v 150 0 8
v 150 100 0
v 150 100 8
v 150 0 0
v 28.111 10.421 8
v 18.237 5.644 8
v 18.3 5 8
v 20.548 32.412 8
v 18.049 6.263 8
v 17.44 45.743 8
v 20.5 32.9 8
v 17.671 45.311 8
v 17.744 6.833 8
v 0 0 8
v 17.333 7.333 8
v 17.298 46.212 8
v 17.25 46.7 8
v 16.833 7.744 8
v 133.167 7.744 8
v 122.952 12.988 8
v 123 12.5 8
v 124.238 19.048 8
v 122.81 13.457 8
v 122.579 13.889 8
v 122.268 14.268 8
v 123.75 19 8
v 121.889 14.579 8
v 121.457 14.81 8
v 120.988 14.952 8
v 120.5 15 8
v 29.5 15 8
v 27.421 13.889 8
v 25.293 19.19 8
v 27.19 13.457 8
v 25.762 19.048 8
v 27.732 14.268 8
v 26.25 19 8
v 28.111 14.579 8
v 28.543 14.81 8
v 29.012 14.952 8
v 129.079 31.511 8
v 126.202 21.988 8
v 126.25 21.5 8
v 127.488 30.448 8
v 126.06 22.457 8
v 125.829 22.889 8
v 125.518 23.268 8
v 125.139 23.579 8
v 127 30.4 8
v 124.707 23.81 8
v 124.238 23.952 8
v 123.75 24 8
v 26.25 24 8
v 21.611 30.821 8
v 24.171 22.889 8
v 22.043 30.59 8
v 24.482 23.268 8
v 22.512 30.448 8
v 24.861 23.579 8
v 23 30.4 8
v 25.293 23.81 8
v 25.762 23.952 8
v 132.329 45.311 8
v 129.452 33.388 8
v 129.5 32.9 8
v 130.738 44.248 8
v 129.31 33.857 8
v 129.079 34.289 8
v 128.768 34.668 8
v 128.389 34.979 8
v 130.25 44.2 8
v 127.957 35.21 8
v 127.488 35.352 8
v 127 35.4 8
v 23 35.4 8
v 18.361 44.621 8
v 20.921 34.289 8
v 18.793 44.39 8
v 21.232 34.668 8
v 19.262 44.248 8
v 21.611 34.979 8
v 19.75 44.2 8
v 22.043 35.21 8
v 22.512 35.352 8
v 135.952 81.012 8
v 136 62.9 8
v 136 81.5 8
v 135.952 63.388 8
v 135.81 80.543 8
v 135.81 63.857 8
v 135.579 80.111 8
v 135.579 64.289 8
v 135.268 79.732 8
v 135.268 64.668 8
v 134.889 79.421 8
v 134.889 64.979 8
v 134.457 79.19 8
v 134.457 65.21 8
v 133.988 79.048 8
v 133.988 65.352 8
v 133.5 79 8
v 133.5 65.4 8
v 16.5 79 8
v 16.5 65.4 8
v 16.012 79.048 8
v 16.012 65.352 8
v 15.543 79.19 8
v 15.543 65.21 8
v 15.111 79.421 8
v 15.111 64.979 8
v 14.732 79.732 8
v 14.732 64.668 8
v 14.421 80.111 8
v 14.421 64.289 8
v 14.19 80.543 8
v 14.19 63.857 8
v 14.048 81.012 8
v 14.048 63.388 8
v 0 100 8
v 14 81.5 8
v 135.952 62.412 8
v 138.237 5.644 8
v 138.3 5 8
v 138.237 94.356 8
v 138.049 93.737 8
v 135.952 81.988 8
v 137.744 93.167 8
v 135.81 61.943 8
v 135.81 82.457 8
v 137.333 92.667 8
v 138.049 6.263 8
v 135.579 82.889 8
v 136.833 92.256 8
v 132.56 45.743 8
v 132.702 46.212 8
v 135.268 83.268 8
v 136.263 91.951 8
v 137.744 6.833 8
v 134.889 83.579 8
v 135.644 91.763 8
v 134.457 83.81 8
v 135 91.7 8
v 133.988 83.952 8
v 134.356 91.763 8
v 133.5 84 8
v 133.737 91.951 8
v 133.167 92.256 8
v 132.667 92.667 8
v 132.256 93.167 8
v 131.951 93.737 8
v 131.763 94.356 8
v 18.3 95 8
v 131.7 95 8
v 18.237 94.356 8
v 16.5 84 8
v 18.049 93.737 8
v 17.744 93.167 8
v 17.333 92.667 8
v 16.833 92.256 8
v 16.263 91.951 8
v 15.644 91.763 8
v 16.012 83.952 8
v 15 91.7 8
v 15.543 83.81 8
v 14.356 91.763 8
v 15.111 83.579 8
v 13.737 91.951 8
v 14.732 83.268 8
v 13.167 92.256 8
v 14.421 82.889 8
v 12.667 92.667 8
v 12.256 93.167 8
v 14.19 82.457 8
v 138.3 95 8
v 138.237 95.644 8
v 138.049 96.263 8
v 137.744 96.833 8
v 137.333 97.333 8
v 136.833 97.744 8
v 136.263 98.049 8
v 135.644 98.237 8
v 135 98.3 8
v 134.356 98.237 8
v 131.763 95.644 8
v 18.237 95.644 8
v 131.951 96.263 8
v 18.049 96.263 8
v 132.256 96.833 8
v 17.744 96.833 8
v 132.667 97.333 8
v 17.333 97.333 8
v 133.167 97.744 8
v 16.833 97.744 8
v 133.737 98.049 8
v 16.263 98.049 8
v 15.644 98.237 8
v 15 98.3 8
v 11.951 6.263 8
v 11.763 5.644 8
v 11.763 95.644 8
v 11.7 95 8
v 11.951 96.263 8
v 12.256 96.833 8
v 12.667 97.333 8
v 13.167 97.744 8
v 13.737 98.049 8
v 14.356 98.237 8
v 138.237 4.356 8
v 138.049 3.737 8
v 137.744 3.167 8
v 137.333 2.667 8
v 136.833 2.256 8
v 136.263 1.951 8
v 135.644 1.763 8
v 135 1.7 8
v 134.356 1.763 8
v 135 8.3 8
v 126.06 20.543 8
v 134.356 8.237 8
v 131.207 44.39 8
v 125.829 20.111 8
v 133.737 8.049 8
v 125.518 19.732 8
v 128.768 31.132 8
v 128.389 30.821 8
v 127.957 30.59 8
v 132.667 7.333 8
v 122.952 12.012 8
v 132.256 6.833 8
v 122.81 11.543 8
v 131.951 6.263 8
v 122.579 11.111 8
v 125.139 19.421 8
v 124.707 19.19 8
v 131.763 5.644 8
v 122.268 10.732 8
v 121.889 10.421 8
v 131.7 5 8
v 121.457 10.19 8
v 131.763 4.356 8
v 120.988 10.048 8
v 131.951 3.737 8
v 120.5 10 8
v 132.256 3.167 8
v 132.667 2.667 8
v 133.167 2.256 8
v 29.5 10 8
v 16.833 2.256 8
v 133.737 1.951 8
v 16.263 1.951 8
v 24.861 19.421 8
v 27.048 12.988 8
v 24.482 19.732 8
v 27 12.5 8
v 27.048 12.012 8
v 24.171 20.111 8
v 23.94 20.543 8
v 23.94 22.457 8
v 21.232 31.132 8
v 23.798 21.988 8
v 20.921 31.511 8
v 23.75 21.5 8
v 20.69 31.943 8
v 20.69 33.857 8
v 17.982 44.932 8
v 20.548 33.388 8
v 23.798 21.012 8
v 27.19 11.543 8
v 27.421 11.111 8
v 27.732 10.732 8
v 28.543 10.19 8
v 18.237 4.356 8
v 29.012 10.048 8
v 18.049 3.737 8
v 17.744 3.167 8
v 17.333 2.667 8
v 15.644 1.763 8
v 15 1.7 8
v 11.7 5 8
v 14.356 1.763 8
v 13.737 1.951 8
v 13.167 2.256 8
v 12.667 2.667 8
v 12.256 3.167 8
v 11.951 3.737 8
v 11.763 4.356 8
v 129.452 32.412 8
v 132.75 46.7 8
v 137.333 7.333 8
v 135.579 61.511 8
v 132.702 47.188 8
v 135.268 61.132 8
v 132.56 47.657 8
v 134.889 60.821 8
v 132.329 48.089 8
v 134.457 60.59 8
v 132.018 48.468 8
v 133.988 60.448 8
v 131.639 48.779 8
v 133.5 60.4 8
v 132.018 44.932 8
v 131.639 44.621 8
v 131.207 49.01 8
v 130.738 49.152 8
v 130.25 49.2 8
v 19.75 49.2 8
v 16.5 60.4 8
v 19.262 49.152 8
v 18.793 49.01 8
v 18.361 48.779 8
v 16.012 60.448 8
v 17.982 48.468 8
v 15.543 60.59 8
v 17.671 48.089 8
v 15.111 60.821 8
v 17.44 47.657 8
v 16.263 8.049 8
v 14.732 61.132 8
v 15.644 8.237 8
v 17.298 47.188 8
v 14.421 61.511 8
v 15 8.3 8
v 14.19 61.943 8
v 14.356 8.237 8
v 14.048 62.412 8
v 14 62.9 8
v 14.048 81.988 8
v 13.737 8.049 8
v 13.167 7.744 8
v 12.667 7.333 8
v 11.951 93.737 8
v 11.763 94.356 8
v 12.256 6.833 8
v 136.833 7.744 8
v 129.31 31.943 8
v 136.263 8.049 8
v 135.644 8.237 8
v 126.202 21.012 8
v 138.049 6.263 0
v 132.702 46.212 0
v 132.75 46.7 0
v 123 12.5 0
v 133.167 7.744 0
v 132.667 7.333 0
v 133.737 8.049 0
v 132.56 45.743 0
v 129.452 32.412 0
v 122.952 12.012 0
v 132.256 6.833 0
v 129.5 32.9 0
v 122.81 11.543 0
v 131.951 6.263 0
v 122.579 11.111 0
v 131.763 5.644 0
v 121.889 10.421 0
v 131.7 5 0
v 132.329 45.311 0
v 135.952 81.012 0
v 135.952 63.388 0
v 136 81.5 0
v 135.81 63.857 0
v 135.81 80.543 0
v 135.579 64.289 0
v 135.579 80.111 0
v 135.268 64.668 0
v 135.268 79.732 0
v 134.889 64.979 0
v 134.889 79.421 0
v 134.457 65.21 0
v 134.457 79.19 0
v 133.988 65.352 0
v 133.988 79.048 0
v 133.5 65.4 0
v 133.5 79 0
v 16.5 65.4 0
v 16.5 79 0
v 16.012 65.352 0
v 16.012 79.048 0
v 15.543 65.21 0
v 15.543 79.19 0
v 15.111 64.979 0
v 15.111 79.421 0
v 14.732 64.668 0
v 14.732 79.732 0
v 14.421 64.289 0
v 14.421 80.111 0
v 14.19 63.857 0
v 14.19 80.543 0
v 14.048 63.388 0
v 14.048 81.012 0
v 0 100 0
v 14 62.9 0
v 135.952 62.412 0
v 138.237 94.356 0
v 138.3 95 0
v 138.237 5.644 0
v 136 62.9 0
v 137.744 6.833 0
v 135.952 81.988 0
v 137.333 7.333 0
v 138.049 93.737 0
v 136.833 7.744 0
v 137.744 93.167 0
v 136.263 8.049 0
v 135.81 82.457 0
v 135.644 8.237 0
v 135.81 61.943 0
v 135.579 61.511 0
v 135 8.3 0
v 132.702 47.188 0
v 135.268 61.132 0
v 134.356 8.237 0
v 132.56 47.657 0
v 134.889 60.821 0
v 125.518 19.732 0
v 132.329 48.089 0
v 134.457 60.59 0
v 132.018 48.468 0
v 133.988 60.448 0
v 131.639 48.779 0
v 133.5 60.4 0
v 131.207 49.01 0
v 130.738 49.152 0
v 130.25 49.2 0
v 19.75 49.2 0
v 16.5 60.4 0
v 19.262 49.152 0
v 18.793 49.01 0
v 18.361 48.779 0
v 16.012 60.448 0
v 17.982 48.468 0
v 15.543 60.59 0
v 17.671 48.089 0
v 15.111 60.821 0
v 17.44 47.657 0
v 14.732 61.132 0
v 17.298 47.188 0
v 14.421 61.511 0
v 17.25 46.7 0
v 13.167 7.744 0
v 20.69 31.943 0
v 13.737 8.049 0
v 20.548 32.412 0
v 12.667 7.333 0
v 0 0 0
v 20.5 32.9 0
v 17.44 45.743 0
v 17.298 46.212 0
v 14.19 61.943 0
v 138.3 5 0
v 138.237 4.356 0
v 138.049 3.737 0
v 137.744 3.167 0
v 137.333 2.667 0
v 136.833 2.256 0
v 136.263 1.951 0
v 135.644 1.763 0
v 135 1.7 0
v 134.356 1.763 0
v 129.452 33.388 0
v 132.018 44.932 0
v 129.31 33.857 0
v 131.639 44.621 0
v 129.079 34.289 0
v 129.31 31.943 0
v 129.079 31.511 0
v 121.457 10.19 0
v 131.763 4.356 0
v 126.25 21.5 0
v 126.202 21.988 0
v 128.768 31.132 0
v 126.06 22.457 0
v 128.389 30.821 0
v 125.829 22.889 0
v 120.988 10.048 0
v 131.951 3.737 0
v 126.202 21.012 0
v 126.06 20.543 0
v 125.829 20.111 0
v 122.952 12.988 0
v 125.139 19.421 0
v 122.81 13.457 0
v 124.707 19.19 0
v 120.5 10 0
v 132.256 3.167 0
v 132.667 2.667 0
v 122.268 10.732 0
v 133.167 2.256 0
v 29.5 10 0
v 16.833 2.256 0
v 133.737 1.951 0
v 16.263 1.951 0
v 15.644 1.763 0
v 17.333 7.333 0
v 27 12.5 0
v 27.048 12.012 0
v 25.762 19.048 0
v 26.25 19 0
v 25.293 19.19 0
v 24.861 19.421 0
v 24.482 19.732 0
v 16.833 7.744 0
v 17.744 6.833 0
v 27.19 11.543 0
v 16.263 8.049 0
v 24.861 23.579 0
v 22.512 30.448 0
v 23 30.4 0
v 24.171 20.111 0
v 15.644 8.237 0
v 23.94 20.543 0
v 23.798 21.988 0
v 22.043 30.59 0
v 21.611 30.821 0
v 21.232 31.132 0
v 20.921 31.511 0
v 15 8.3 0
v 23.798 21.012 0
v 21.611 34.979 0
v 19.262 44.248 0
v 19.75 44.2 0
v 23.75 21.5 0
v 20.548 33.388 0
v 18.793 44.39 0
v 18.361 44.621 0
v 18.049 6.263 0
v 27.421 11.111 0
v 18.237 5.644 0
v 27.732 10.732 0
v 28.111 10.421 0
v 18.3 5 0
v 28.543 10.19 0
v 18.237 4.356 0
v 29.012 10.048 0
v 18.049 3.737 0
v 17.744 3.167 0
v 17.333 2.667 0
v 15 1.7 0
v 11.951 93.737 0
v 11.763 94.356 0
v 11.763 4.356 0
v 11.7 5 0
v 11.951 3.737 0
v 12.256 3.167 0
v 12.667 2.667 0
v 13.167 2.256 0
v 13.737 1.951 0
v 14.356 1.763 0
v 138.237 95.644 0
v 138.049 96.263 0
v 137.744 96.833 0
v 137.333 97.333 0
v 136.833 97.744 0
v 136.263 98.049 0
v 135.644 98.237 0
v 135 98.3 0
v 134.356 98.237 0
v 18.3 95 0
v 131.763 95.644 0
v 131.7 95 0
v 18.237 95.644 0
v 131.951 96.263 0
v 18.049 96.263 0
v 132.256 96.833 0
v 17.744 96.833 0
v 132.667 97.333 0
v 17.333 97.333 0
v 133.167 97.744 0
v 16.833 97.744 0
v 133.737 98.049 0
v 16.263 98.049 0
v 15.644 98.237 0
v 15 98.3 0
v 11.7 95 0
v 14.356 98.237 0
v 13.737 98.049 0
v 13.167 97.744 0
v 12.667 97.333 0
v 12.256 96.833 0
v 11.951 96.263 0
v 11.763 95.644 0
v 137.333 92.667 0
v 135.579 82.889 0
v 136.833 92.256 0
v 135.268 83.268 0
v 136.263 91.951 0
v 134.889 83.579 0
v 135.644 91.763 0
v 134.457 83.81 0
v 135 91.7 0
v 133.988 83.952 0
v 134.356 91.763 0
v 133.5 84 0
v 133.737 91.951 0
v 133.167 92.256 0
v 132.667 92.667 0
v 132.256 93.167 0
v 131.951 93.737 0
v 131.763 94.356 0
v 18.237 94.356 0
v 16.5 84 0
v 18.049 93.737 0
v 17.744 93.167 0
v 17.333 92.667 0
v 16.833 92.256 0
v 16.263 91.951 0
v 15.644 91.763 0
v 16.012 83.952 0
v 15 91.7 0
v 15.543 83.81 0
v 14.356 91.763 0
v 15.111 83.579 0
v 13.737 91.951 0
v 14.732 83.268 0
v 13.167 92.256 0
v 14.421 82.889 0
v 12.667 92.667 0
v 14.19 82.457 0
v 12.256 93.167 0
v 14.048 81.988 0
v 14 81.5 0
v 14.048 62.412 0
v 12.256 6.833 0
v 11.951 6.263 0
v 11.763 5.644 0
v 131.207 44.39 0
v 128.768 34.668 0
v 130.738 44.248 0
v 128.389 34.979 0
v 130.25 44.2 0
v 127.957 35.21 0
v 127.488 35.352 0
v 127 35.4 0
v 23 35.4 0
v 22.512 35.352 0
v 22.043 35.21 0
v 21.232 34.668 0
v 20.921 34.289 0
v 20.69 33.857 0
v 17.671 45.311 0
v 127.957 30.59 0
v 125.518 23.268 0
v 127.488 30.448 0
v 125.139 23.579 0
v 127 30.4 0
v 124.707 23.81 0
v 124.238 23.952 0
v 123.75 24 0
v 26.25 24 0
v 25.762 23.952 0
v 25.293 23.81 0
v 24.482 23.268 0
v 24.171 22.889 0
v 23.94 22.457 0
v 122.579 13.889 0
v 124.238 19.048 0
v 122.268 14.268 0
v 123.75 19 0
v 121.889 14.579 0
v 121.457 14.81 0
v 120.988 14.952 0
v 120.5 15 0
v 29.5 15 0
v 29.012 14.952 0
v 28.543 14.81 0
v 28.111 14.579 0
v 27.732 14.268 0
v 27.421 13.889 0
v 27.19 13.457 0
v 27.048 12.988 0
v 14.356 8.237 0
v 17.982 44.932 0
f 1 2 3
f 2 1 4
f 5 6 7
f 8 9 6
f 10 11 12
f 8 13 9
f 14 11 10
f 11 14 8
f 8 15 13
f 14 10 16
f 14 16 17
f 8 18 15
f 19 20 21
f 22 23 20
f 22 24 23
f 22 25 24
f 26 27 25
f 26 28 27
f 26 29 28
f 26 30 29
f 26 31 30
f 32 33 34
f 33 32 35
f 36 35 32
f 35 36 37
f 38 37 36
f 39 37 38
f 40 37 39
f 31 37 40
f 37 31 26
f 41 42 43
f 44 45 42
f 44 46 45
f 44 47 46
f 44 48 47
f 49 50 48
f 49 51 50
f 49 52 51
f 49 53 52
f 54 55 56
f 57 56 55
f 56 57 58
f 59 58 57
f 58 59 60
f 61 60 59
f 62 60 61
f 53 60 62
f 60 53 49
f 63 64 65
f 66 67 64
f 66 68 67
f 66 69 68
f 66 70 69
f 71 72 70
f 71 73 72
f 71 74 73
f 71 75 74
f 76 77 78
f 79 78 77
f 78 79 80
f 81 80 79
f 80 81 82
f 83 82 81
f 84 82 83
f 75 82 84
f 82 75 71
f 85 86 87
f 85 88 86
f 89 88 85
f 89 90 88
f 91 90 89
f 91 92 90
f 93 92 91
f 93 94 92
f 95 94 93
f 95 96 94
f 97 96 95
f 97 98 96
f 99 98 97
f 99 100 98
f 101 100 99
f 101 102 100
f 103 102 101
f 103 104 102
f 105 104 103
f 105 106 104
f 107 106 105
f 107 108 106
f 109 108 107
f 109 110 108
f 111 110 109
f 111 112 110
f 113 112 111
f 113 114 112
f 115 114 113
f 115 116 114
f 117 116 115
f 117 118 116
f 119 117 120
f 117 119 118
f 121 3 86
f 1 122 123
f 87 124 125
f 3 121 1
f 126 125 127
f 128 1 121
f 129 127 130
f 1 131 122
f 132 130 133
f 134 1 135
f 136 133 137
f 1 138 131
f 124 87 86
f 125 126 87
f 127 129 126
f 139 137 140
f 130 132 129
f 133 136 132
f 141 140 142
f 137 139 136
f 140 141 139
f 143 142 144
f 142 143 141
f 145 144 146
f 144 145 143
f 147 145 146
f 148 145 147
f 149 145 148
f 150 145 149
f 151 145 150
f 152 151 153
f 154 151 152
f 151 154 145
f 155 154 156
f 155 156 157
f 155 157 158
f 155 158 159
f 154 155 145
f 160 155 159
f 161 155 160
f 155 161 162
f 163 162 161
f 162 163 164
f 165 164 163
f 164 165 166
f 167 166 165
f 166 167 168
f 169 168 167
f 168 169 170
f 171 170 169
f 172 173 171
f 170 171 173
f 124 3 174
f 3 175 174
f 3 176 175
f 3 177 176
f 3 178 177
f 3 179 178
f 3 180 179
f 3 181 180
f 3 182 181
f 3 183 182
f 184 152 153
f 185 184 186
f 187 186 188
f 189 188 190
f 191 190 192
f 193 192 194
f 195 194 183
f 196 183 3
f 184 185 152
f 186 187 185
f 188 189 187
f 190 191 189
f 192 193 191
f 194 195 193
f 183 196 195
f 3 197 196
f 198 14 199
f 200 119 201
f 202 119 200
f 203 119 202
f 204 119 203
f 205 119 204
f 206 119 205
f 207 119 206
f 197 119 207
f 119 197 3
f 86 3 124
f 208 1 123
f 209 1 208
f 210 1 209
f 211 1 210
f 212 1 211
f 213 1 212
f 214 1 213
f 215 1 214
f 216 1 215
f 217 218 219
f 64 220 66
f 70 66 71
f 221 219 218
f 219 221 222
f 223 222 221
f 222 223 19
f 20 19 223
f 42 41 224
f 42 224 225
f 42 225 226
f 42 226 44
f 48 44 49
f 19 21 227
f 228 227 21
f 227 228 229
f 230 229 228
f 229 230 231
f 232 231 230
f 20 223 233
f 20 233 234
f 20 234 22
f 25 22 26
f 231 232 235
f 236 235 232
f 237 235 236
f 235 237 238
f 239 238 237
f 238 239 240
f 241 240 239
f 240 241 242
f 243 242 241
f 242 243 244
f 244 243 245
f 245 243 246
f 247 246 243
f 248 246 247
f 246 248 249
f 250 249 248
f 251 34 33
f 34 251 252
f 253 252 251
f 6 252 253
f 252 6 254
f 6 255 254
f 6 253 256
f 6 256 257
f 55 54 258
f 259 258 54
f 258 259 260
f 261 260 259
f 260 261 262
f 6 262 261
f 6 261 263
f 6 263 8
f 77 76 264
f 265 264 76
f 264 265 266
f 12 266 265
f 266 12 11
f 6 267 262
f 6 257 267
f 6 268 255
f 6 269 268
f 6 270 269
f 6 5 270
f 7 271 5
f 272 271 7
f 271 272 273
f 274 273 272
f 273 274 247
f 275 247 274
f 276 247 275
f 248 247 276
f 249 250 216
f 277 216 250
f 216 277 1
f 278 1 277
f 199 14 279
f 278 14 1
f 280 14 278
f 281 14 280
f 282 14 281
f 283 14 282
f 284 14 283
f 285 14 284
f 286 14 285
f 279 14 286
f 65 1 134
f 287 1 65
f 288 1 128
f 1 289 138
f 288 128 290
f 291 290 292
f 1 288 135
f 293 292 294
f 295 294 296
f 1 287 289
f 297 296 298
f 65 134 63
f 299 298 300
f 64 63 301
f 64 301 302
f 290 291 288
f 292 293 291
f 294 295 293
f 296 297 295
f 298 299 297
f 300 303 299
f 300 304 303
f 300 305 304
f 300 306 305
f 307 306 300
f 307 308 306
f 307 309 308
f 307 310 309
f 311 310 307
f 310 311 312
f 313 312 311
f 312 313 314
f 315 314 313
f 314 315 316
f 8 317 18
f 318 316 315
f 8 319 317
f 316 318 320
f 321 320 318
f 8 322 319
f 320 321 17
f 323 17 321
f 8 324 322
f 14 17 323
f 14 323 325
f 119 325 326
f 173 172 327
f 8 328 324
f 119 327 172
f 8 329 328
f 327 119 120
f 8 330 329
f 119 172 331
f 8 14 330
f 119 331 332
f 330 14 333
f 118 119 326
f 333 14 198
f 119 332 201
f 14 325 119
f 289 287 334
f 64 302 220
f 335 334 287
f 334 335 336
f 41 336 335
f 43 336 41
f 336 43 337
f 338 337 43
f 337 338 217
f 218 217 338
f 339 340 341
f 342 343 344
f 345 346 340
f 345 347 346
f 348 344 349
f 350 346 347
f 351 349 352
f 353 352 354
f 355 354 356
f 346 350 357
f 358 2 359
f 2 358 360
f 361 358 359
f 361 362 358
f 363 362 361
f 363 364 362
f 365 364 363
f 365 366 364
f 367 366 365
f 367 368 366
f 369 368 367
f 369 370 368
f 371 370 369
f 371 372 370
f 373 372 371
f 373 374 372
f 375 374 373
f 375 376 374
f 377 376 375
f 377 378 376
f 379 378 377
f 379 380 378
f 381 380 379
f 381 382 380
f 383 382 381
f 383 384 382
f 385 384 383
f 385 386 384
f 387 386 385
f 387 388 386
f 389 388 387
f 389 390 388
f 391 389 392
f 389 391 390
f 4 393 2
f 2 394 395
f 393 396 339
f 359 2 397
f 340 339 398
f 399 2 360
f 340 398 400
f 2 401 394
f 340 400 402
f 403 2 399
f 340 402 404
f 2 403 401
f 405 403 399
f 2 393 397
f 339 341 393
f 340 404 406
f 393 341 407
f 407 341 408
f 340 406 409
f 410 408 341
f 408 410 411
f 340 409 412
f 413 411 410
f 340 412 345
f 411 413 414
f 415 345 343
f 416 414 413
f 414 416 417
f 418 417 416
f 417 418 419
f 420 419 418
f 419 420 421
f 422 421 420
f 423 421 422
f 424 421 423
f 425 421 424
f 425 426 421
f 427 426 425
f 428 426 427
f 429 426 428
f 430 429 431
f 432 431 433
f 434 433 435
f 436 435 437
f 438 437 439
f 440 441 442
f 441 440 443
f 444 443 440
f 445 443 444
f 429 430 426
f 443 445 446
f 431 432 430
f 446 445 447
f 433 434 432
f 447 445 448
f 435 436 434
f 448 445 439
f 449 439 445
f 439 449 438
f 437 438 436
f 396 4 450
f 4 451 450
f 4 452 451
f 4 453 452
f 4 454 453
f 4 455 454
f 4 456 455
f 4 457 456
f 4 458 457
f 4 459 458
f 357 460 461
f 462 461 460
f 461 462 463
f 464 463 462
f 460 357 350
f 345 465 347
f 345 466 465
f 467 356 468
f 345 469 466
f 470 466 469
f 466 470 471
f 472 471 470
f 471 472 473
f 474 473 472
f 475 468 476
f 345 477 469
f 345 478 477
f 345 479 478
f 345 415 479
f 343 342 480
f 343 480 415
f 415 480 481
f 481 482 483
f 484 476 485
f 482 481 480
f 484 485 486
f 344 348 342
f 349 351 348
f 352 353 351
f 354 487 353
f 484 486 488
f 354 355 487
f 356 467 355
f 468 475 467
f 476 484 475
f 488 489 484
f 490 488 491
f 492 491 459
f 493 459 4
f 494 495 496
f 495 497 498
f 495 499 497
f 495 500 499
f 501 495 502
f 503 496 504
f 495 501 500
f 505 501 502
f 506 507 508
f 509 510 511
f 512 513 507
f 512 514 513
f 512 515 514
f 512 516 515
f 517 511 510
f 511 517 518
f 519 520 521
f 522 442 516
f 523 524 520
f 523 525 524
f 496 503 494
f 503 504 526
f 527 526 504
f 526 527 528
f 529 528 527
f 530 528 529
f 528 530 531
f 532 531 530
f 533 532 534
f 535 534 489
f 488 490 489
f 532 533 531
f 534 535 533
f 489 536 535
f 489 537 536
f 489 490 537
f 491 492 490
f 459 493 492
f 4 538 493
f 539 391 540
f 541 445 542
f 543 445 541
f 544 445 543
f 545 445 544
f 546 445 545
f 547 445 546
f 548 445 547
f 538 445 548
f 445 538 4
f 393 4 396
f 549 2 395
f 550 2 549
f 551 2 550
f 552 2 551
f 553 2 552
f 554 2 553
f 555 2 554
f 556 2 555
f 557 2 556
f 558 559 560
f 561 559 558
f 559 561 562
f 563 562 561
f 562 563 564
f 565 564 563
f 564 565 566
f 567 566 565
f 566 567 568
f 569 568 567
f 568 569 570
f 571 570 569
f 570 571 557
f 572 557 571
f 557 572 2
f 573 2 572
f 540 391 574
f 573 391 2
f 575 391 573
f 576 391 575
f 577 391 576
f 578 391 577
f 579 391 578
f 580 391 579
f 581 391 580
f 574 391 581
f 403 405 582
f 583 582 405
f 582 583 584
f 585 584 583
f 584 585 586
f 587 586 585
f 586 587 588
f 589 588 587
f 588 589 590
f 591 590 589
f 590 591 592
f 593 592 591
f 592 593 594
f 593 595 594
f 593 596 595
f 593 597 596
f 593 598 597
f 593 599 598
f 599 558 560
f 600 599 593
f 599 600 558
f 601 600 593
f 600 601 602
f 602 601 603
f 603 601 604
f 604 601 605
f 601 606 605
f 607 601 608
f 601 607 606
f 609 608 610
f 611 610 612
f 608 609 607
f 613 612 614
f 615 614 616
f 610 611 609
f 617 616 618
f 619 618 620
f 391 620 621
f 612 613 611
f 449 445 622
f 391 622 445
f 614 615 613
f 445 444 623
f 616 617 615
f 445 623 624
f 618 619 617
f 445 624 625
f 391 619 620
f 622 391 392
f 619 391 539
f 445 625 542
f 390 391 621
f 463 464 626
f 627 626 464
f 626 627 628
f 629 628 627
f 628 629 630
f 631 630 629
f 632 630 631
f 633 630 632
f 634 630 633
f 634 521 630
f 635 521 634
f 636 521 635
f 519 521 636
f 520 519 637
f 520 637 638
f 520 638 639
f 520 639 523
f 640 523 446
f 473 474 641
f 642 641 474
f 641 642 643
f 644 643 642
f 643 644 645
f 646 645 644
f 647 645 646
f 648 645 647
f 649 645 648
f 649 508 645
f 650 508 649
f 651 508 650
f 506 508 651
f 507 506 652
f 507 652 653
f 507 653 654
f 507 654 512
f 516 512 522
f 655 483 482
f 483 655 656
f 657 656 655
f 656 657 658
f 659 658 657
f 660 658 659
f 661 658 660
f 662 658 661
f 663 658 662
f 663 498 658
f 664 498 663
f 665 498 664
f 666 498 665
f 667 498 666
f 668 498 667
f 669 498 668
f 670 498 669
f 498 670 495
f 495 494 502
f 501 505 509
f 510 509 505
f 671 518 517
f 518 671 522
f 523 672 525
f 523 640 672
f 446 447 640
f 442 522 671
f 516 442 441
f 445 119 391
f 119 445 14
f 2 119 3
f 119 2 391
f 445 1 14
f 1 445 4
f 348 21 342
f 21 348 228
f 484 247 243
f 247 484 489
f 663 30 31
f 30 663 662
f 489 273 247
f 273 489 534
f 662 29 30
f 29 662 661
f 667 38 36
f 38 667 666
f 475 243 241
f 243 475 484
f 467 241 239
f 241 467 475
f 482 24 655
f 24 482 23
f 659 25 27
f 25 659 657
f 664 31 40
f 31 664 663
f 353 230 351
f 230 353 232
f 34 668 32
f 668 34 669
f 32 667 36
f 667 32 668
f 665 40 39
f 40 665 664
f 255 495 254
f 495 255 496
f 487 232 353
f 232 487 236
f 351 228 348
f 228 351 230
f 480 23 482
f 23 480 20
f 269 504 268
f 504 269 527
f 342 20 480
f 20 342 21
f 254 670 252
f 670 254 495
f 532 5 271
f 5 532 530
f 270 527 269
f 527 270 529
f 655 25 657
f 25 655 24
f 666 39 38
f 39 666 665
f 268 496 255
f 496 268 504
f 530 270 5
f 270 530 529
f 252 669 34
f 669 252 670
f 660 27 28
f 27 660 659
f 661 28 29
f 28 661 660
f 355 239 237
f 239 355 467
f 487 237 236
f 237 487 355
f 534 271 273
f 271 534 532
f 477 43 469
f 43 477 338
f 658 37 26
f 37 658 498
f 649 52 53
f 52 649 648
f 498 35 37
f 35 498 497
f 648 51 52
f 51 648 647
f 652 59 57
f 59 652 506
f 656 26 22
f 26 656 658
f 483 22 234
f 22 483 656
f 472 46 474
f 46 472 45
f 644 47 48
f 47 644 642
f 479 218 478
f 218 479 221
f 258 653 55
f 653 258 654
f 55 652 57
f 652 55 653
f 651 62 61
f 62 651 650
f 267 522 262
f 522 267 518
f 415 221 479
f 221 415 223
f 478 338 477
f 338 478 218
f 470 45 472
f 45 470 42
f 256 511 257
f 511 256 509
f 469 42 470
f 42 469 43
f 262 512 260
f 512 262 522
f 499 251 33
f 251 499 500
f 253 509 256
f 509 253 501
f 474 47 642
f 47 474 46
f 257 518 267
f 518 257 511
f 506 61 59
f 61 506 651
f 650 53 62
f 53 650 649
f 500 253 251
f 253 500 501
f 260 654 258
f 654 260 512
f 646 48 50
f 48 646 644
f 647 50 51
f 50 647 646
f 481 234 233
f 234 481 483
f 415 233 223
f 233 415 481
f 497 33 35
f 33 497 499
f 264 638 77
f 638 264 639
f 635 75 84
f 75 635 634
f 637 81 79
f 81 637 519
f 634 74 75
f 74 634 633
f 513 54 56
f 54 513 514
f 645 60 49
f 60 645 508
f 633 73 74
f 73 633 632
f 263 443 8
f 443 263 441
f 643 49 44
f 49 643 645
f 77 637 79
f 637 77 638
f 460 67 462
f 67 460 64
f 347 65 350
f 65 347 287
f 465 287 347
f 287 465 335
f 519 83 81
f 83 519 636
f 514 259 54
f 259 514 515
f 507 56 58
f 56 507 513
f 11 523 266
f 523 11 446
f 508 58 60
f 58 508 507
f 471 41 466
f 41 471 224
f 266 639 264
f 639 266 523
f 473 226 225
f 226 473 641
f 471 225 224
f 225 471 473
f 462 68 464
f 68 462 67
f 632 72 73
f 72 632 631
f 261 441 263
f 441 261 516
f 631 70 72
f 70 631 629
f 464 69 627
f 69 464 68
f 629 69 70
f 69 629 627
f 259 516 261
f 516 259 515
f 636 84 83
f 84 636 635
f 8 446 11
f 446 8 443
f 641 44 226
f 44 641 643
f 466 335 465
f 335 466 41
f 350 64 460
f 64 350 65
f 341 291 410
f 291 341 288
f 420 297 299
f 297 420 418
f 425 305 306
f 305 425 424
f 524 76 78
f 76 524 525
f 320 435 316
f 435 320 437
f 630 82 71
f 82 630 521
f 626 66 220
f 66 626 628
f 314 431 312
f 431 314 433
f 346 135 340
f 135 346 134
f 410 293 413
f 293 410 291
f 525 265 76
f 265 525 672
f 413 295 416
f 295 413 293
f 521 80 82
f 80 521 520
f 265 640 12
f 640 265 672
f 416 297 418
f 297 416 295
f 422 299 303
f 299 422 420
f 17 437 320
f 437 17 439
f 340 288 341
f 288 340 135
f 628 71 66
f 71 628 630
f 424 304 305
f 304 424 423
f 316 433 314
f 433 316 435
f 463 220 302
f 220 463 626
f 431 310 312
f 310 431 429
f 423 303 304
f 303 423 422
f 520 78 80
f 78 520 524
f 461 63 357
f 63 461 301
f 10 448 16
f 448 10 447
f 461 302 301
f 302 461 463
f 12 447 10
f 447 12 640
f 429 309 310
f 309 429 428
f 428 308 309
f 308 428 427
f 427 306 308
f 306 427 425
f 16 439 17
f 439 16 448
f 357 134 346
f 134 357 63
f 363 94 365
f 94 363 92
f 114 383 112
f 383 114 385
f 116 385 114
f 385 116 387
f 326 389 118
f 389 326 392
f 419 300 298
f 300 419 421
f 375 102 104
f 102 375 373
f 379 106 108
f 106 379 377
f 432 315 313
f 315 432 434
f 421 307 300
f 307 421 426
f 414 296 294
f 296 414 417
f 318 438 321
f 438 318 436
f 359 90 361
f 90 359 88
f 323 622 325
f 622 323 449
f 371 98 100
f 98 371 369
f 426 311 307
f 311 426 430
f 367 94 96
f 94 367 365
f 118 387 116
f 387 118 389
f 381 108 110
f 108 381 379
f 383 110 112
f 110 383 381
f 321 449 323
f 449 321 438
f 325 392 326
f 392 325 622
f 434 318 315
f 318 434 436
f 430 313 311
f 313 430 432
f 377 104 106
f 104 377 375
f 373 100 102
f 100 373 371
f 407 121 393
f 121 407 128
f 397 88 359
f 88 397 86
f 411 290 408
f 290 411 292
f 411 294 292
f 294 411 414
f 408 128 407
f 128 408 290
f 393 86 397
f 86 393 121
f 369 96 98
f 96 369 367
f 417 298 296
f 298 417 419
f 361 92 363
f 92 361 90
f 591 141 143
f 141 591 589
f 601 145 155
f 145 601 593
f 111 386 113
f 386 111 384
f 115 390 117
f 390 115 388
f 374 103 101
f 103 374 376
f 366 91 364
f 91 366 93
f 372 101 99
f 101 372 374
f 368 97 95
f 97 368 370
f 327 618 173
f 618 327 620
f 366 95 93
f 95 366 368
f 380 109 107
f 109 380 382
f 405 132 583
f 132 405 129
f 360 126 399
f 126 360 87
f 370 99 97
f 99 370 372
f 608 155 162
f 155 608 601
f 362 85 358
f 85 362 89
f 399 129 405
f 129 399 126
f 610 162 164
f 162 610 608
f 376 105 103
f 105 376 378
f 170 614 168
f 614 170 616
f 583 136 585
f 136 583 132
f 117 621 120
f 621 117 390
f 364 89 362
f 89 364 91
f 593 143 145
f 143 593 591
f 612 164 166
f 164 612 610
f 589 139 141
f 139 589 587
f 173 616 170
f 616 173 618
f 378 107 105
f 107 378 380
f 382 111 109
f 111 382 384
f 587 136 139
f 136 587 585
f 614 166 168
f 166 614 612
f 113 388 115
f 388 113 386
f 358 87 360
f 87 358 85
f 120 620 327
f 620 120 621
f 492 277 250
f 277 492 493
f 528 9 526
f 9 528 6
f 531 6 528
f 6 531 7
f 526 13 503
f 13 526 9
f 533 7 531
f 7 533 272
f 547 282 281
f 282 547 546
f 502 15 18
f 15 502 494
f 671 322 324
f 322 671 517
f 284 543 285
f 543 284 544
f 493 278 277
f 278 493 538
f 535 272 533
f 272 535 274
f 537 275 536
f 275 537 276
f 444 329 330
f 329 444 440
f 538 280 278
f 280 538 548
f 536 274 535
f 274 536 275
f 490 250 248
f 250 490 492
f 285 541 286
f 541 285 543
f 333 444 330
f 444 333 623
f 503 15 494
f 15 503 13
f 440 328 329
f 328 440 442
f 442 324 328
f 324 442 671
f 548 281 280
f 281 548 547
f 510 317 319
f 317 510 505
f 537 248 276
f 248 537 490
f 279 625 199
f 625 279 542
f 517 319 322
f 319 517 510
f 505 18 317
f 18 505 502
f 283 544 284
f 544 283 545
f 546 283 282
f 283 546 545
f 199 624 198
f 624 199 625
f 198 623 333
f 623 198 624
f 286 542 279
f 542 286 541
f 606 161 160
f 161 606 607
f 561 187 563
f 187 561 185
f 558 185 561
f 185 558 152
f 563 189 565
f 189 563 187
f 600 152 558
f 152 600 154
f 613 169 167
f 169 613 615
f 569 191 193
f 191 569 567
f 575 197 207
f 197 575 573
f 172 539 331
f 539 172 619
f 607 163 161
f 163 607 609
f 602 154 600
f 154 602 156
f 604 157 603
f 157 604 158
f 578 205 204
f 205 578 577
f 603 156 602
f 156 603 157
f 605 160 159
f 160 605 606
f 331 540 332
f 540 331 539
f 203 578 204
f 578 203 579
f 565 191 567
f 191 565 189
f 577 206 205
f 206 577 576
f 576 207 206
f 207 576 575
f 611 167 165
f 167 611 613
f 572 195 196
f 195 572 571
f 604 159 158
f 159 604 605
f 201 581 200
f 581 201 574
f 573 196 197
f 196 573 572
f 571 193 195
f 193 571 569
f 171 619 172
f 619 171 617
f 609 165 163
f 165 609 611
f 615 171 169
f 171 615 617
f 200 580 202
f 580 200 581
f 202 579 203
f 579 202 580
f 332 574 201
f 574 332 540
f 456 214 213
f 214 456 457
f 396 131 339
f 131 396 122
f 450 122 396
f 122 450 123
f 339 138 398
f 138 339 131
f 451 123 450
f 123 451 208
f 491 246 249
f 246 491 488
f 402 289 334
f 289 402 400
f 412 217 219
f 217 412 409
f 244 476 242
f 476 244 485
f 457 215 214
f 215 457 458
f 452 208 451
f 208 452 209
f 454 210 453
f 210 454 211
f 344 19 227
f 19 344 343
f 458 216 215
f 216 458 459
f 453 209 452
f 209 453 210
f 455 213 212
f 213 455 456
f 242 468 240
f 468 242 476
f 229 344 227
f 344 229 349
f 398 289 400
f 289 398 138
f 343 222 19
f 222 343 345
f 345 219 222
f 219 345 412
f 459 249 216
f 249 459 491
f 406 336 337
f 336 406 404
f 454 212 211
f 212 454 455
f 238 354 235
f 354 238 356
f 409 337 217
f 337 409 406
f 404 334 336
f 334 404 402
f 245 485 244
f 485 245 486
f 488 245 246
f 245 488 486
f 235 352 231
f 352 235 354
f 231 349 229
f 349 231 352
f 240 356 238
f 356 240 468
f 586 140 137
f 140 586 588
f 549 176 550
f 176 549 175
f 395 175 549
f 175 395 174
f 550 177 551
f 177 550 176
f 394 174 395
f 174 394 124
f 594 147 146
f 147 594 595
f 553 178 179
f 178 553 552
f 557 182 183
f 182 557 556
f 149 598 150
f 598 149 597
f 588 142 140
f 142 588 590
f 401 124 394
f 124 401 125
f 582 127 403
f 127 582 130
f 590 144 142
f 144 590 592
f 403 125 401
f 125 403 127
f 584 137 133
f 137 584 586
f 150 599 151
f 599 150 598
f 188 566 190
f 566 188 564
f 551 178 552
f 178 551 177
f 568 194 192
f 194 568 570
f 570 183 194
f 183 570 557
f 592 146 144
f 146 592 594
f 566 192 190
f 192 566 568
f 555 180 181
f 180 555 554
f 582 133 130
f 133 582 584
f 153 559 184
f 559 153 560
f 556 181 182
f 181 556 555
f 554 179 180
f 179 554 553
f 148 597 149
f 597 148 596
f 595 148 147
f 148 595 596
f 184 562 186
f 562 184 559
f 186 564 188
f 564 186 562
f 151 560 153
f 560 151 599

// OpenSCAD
$fn = 32;

// ----------------------------------------------------------------------
// Slotted panel: 150 x 100 mm, 6 рядов of slots
// ----------------------------------------------------------------------

// --- parameters (mm) ---
panel_w = 150;            // panel width
panel_d = 100;            // panel depth
thick = 8;                // panel thickness
slot_w = 5;               // slot width
pitch0 = 9;               // first row pitch
pitch_step = 2.4;         // pitch increase per row
margin = 10;              // margin around the slot field
rows = 6;                 // number of slot rows
mount_d = 6.6;            // mounting holes
mount_x = 60;             // mounting hole offset

difference() {
  union() {
    cube([panel_w, panel_d, thick]);
  }
  /* slot rows: stadium shaped cutters, 2.5 mm clear of both faces */
  /* row 0: pitch 9, length 91 */
  hull() {
    translate([29.5, 12.5, -2.5]) cylinder(h = thick + 5, d = slot_w);
    translate([120.5, 12.5, -2.5]) cylinder(h = thick + 5, d = slot_w);
  }
  /* row 1: pitch 11.4, length 97.5 */
  hull() {
    translate([26.25, 21.5, -2.5]) cylinder(h = thick + 5, d = slot_w);
    translate([123.75, 21.5, -2.5]) cylinder(h = thick + 5, d = slot_w);
  }
  /* row 2: pitch 13.8, length 104 */
  hull() {
    translate([23, 32.9, -2.5]) cylinder(h = thick + 5, d = slot_w);
    translate([127, 32.9, -2.5]) cylinder(h = thick + 5, d = slot_w);
  }
  /* row 3: pitch 16.2, length 110.5 */
  hull() {
    translate([19.75, 46.7, -2.5]) cylinder(h = thick + 5, d = slot_w);
    translate([130.25, 46.7, -2.5]) cylinder(h = thick + 5, d = slot_w);
  }
  /* row 4: pitch 18.6, length 117 */
  hull() {
    translate([16.5, 62.9, -2.5]) cylinder(h = thick + 5, d = slot_w);
    translate([133.5, 62.9, -2.5]) cylinder(h = thick + 5, d = slot_w);
  }
  /* row 5: pitch 21, length 117 */
  hull() {
    translate([16.5, 81.5, -2.5]) cylinder(h = thick + 5, d = slot_w);
    translate([133.5, 81.5, -2.5]) cylinder(h = thick + 5, d = slot_w);
  }
  translate([15, 5, -2.5]) cylinder(h = 13, d = mount_d);
  translate([15, 95, -2.5]) cylinder(h = 13, d = mount_d);
  translate([135, 5, -2.5]) cylinder(h = 13, d = mount_d);
  translate([135, 95, -2.5]) cylinder(h = 13, d = mount_d);
}
